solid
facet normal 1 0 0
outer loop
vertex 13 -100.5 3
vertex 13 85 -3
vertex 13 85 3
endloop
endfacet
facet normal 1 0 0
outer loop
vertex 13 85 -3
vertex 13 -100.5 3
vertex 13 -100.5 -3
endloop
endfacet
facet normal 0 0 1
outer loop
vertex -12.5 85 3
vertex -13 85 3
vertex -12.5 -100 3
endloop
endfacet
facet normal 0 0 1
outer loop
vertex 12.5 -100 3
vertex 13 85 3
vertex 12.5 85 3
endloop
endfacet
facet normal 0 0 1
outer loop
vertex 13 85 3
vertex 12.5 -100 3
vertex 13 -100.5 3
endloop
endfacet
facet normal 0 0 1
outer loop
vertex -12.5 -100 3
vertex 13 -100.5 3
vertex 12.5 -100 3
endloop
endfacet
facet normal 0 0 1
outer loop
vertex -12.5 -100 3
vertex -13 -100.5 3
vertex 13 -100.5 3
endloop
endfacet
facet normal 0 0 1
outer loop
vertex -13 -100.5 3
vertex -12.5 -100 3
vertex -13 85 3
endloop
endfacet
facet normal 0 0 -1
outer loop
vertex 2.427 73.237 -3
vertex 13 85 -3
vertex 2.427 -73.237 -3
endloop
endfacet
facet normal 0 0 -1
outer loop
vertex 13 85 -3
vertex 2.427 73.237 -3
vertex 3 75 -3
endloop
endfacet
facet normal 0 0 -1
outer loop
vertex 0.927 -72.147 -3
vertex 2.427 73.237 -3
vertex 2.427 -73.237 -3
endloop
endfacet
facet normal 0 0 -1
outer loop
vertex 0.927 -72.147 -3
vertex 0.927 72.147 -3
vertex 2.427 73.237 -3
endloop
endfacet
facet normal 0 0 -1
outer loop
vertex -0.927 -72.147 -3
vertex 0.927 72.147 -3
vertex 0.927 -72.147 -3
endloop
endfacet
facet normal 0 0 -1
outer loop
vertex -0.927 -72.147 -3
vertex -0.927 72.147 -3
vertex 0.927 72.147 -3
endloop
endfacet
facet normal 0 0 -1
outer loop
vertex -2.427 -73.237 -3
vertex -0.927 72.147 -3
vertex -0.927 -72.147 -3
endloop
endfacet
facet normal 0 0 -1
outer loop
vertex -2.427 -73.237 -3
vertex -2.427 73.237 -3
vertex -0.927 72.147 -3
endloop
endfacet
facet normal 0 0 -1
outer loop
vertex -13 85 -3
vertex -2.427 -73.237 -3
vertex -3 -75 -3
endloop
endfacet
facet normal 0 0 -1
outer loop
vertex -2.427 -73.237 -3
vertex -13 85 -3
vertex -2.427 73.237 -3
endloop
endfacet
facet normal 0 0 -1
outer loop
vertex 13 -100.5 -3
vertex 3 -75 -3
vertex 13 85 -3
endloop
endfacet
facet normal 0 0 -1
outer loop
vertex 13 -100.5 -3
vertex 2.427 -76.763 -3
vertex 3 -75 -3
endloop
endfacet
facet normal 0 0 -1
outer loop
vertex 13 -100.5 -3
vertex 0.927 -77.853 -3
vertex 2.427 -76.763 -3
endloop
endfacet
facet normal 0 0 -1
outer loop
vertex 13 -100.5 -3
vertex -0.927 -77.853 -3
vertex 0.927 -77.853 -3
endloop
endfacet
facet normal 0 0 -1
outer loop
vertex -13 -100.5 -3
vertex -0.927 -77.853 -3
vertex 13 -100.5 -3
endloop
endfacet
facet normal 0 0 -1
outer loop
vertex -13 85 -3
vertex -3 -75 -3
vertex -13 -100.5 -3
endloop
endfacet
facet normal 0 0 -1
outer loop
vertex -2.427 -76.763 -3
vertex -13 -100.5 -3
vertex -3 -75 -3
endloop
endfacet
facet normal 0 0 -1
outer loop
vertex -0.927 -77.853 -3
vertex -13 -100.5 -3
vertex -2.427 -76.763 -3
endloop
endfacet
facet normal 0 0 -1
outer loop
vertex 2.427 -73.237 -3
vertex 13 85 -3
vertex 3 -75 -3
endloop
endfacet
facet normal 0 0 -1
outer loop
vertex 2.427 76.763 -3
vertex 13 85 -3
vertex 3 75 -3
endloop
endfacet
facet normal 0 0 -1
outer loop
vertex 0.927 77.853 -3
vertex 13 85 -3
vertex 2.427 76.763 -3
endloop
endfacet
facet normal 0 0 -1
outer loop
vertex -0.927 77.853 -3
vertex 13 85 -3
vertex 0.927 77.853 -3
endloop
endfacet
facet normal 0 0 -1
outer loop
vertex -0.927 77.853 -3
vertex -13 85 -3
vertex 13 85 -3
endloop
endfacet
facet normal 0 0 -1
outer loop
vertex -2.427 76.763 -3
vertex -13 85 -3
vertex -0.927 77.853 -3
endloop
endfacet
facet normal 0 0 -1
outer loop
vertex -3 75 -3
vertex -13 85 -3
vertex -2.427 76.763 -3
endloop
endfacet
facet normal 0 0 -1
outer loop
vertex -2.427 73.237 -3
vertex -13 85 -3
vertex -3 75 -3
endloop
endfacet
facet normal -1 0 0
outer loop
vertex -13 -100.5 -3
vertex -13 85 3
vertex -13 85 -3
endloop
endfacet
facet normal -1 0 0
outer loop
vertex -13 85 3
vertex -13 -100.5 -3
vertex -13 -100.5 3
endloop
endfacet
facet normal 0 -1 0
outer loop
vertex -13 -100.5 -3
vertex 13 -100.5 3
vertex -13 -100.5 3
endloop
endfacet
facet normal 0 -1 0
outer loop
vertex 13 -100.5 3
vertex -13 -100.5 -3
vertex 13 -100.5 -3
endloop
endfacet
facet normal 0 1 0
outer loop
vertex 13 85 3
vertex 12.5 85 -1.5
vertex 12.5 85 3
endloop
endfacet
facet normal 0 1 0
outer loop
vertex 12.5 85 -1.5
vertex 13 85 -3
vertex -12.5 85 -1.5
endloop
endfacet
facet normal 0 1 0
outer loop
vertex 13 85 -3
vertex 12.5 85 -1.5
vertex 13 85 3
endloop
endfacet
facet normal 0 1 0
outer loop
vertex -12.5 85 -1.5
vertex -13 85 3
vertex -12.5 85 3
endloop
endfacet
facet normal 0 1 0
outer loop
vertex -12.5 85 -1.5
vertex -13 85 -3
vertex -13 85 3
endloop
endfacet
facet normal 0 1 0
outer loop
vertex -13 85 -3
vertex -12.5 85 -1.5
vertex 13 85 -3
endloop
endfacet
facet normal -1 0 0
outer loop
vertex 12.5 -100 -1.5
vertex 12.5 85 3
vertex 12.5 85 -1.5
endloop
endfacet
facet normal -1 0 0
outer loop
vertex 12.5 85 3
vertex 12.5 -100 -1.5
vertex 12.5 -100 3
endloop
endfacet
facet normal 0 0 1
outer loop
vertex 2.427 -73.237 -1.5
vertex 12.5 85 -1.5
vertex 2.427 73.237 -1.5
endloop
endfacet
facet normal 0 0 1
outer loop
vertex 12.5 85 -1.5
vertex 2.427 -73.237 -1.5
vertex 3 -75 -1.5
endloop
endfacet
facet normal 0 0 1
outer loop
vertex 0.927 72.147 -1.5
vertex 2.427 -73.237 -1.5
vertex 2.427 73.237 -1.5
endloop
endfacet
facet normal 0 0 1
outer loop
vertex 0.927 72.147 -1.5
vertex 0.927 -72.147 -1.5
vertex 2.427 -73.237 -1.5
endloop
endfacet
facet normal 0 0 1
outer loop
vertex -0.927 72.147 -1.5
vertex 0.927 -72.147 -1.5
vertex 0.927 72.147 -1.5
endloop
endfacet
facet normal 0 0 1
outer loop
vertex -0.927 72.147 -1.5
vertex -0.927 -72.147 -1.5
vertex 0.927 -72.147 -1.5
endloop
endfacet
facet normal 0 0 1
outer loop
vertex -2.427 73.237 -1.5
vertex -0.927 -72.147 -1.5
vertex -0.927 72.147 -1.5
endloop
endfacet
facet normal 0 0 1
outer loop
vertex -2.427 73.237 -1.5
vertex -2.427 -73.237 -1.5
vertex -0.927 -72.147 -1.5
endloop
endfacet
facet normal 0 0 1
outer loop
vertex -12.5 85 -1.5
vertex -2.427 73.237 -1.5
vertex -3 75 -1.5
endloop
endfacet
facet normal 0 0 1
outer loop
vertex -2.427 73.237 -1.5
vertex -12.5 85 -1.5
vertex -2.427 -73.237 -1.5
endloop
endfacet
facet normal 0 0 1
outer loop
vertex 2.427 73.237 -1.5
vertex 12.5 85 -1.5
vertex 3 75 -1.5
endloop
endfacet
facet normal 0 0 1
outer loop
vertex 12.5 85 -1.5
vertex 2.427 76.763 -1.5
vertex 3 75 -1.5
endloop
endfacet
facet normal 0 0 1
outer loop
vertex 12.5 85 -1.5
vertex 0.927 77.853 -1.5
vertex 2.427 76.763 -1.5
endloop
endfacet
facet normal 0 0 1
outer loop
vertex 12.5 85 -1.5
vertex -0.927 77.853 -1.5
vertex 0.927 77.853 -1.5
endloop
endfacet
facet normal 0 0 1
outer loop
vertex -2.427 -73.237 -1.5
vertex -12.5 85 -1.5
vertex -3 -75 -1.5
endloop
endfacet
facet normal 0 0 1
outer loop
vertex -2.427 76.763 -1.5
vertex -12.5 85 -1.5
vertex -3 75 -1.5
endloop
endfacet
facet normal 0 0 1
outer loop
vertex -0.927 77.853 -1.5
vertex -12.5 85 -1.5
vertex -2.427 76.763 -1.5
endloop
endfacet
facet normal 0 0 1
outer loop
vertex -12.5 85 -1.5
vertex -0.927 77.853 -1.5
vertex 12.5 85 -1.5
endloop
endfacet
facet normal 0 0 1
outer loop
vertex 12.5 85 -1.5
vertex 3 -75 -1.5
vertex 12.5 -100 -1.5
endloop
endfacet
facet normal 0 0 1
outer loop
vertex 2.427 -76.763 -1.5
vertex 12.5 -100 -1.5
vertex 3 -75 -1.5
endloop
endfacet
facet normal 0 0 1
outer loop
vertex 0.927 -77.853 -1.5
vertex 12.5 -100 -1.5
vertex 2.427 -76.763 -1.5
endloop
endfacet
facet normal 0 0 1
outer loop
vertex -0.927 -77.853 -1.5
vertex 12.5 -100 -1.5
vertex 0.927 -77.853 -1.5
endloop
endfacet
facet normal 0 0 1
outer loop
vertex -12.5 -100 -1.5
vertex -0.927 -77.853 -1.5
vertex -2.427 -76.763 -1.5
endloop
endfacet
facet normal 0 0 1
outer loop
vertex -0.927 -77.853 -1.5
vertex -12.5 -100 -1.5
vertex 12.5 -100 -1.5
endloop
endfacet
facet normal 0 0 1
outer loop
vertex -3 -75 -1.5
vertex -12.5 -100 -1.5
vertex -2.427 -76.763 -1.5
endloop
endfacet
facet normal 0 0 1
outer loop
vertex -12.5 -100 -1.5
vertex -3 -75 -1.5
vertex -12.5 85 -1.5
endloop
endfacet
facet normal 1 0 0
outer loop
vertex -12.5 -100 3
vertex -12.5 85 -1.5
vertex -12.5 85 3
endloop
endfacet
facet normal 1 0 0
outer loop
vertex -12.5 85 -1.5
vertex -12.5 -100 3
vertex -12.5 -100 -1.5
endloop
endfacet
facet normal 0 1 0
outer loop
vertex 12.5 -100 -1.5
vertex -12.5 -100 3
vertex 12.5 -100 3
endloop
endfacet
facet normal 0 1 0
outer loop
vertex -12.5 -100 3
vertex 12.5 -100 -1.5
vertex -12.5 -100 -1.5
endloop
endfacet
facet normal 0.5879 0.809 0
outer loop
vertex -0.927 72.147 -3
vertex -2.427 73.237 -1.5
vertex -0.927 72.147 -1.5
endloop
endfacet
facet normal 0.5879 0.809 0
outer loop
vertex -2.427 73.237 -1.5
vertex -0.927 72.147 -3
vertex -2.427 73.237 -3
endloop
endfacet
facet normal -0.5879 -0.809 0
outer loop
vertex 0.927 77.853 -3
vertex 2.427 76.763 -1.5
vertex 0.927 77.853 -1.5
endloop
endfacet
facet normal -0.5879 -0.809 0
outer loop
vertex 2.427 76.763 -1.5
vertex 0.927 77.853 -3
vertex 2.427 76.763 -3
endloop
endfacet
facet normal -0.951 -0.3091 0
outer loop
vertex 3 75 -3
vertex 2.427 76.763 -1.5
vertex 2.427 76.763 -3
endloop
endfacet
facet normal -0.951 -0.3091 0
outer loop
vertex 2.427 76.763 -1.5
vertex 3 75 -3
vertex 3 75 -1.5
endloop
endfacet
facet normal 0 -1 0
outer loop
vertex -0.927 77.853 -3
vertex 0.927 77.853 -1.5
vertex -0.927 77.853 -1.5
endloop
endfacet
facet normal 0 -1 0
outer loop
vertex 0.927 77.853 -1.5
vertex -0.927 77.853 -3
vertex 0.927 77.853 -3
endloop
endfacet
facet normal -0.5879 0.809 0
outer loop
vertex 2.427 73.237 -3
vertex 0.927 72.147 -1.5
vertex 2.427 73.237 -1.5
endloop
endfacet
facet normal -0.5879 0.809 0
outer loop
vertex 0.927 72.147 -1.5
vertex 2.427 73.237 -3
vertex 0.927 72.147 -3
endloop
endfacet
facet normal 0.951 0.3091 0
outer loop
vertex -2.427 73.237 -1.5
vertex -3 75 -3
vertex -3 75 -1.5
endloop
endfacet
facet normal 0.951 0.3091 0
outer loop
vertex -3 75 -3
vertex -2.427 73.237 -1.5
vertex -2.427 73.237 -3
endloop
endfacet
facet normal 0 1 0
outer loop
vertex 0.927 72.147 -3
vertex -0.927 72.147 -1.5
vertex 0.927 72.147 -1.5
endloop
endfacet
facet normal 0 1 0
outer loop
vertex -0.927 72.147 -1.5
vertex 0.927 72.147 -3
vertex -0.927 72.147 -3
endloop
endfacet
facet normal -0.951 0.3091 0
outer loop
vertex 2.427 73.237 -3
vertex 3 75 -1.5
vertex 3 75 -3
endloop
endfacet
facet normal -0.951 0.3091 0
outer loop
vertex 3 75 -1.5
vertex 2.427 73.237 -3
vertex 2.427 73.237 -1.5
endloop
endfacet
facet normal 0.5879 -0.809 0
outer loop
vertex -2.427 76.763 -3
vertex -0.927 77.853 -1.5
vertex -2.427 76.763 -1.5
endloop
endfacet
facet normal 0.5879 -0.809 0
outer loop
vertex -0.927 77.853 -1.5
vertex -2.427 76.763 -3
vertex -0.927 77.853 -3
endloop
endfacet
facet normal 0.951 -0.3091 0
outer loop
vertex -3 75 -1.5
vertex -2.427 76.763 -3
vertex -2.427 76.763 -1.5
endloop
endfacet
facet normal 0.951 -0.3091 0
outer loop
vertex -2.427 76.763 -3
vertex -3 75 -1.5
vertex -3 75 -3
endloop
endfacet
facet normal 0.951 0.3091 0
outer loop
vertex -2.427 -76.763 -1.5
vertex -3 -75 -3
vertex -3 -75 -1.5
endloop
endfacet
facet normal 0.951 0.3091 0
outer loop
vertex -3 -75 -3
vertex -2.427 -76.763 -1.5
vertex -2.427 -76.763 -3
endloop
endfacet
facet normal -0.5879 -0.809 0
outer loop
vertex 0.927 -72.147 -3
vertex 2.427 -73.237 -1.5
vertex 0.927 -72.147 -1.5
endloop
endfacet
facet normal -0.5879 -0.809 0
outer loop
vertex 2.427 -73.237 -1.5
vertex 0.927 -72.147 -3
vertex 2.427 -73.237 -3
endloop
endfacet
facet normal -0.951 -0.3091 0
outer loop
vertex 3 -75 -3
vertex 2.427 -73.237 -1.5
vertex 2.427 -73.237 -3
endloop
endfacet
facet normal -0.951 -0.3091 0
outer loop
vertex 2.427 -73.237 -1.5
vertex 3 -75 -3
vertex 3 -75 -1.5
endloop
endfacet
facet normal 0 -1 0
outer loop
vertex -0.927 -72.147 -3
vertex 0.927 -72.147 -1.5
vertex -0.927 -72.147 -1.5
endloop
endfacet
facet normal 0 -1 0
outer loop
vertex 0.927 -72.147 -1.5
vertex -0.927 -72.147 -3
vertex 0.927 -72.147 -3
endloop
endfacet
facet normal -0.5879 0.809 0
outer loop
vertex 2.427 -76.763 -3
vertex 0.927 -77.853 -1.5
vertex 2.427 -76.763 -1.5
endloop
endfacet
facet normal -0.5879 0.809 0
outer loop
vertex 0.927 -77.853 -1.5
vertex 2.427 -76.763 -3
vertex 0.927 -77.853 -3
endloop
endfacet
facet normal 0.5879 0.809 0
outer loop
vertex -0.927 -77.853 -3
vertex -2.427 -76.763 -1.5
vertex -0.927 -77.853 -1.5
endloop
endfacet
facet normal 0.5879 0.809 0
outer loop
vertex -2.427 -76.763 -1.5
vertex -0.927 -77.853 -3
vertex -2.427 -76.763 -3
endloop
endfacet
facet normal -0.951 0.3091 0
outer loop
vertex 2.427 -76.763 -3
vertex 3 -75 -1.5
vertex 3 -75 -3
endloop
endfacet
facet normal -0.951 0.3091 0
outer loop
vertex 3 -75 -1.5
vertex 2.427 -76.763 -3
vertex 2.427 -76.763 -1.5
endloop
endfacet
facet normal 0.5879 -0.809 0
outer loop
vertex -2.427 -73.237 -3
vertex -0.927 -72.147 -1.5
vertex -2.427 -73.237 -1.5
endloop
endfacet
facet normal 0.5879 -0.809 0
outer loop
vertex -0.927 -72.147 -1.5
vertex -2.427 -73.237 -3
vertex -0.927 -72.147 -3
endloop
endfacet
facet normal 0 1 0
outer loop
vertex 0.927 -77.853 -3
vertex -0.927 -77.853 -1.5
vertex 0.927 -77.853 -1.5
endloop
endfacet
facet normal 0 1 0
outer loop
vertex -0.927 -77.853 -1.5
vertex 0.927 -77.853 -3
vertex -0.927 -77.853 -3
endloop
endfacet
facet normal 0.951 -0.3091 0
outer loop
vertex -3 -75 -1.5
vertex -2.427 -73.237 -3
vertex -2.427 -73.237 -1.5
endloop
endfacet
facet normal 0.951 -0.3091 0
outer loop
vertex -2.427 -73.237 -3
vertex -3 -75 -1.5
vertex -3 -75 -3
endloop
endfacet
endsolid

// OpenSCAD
h = 10;
d = 3;
largo = 200;
ancho = 25;
grosor = 5;
distancia_cadenas = 150/2;
delta = 1;
distancia_recorte = 200/2;
recorte = 30;

difference(){
	cube([ancho+delta,largo+delta,grosor+delta], center=true);
	translate([0,distancia_recorte,0]) cube([recorte,recorte,recorte], center=true);
	translate([0,0,delta]) cube([ancho,largo,grosor], center=true);
	translate([0,distancia_cadenas,0]) cylinder(h,d,d,true);
	translate([0,-distancia_cadenas,0]) cylinder(h,d,d,true);
}
